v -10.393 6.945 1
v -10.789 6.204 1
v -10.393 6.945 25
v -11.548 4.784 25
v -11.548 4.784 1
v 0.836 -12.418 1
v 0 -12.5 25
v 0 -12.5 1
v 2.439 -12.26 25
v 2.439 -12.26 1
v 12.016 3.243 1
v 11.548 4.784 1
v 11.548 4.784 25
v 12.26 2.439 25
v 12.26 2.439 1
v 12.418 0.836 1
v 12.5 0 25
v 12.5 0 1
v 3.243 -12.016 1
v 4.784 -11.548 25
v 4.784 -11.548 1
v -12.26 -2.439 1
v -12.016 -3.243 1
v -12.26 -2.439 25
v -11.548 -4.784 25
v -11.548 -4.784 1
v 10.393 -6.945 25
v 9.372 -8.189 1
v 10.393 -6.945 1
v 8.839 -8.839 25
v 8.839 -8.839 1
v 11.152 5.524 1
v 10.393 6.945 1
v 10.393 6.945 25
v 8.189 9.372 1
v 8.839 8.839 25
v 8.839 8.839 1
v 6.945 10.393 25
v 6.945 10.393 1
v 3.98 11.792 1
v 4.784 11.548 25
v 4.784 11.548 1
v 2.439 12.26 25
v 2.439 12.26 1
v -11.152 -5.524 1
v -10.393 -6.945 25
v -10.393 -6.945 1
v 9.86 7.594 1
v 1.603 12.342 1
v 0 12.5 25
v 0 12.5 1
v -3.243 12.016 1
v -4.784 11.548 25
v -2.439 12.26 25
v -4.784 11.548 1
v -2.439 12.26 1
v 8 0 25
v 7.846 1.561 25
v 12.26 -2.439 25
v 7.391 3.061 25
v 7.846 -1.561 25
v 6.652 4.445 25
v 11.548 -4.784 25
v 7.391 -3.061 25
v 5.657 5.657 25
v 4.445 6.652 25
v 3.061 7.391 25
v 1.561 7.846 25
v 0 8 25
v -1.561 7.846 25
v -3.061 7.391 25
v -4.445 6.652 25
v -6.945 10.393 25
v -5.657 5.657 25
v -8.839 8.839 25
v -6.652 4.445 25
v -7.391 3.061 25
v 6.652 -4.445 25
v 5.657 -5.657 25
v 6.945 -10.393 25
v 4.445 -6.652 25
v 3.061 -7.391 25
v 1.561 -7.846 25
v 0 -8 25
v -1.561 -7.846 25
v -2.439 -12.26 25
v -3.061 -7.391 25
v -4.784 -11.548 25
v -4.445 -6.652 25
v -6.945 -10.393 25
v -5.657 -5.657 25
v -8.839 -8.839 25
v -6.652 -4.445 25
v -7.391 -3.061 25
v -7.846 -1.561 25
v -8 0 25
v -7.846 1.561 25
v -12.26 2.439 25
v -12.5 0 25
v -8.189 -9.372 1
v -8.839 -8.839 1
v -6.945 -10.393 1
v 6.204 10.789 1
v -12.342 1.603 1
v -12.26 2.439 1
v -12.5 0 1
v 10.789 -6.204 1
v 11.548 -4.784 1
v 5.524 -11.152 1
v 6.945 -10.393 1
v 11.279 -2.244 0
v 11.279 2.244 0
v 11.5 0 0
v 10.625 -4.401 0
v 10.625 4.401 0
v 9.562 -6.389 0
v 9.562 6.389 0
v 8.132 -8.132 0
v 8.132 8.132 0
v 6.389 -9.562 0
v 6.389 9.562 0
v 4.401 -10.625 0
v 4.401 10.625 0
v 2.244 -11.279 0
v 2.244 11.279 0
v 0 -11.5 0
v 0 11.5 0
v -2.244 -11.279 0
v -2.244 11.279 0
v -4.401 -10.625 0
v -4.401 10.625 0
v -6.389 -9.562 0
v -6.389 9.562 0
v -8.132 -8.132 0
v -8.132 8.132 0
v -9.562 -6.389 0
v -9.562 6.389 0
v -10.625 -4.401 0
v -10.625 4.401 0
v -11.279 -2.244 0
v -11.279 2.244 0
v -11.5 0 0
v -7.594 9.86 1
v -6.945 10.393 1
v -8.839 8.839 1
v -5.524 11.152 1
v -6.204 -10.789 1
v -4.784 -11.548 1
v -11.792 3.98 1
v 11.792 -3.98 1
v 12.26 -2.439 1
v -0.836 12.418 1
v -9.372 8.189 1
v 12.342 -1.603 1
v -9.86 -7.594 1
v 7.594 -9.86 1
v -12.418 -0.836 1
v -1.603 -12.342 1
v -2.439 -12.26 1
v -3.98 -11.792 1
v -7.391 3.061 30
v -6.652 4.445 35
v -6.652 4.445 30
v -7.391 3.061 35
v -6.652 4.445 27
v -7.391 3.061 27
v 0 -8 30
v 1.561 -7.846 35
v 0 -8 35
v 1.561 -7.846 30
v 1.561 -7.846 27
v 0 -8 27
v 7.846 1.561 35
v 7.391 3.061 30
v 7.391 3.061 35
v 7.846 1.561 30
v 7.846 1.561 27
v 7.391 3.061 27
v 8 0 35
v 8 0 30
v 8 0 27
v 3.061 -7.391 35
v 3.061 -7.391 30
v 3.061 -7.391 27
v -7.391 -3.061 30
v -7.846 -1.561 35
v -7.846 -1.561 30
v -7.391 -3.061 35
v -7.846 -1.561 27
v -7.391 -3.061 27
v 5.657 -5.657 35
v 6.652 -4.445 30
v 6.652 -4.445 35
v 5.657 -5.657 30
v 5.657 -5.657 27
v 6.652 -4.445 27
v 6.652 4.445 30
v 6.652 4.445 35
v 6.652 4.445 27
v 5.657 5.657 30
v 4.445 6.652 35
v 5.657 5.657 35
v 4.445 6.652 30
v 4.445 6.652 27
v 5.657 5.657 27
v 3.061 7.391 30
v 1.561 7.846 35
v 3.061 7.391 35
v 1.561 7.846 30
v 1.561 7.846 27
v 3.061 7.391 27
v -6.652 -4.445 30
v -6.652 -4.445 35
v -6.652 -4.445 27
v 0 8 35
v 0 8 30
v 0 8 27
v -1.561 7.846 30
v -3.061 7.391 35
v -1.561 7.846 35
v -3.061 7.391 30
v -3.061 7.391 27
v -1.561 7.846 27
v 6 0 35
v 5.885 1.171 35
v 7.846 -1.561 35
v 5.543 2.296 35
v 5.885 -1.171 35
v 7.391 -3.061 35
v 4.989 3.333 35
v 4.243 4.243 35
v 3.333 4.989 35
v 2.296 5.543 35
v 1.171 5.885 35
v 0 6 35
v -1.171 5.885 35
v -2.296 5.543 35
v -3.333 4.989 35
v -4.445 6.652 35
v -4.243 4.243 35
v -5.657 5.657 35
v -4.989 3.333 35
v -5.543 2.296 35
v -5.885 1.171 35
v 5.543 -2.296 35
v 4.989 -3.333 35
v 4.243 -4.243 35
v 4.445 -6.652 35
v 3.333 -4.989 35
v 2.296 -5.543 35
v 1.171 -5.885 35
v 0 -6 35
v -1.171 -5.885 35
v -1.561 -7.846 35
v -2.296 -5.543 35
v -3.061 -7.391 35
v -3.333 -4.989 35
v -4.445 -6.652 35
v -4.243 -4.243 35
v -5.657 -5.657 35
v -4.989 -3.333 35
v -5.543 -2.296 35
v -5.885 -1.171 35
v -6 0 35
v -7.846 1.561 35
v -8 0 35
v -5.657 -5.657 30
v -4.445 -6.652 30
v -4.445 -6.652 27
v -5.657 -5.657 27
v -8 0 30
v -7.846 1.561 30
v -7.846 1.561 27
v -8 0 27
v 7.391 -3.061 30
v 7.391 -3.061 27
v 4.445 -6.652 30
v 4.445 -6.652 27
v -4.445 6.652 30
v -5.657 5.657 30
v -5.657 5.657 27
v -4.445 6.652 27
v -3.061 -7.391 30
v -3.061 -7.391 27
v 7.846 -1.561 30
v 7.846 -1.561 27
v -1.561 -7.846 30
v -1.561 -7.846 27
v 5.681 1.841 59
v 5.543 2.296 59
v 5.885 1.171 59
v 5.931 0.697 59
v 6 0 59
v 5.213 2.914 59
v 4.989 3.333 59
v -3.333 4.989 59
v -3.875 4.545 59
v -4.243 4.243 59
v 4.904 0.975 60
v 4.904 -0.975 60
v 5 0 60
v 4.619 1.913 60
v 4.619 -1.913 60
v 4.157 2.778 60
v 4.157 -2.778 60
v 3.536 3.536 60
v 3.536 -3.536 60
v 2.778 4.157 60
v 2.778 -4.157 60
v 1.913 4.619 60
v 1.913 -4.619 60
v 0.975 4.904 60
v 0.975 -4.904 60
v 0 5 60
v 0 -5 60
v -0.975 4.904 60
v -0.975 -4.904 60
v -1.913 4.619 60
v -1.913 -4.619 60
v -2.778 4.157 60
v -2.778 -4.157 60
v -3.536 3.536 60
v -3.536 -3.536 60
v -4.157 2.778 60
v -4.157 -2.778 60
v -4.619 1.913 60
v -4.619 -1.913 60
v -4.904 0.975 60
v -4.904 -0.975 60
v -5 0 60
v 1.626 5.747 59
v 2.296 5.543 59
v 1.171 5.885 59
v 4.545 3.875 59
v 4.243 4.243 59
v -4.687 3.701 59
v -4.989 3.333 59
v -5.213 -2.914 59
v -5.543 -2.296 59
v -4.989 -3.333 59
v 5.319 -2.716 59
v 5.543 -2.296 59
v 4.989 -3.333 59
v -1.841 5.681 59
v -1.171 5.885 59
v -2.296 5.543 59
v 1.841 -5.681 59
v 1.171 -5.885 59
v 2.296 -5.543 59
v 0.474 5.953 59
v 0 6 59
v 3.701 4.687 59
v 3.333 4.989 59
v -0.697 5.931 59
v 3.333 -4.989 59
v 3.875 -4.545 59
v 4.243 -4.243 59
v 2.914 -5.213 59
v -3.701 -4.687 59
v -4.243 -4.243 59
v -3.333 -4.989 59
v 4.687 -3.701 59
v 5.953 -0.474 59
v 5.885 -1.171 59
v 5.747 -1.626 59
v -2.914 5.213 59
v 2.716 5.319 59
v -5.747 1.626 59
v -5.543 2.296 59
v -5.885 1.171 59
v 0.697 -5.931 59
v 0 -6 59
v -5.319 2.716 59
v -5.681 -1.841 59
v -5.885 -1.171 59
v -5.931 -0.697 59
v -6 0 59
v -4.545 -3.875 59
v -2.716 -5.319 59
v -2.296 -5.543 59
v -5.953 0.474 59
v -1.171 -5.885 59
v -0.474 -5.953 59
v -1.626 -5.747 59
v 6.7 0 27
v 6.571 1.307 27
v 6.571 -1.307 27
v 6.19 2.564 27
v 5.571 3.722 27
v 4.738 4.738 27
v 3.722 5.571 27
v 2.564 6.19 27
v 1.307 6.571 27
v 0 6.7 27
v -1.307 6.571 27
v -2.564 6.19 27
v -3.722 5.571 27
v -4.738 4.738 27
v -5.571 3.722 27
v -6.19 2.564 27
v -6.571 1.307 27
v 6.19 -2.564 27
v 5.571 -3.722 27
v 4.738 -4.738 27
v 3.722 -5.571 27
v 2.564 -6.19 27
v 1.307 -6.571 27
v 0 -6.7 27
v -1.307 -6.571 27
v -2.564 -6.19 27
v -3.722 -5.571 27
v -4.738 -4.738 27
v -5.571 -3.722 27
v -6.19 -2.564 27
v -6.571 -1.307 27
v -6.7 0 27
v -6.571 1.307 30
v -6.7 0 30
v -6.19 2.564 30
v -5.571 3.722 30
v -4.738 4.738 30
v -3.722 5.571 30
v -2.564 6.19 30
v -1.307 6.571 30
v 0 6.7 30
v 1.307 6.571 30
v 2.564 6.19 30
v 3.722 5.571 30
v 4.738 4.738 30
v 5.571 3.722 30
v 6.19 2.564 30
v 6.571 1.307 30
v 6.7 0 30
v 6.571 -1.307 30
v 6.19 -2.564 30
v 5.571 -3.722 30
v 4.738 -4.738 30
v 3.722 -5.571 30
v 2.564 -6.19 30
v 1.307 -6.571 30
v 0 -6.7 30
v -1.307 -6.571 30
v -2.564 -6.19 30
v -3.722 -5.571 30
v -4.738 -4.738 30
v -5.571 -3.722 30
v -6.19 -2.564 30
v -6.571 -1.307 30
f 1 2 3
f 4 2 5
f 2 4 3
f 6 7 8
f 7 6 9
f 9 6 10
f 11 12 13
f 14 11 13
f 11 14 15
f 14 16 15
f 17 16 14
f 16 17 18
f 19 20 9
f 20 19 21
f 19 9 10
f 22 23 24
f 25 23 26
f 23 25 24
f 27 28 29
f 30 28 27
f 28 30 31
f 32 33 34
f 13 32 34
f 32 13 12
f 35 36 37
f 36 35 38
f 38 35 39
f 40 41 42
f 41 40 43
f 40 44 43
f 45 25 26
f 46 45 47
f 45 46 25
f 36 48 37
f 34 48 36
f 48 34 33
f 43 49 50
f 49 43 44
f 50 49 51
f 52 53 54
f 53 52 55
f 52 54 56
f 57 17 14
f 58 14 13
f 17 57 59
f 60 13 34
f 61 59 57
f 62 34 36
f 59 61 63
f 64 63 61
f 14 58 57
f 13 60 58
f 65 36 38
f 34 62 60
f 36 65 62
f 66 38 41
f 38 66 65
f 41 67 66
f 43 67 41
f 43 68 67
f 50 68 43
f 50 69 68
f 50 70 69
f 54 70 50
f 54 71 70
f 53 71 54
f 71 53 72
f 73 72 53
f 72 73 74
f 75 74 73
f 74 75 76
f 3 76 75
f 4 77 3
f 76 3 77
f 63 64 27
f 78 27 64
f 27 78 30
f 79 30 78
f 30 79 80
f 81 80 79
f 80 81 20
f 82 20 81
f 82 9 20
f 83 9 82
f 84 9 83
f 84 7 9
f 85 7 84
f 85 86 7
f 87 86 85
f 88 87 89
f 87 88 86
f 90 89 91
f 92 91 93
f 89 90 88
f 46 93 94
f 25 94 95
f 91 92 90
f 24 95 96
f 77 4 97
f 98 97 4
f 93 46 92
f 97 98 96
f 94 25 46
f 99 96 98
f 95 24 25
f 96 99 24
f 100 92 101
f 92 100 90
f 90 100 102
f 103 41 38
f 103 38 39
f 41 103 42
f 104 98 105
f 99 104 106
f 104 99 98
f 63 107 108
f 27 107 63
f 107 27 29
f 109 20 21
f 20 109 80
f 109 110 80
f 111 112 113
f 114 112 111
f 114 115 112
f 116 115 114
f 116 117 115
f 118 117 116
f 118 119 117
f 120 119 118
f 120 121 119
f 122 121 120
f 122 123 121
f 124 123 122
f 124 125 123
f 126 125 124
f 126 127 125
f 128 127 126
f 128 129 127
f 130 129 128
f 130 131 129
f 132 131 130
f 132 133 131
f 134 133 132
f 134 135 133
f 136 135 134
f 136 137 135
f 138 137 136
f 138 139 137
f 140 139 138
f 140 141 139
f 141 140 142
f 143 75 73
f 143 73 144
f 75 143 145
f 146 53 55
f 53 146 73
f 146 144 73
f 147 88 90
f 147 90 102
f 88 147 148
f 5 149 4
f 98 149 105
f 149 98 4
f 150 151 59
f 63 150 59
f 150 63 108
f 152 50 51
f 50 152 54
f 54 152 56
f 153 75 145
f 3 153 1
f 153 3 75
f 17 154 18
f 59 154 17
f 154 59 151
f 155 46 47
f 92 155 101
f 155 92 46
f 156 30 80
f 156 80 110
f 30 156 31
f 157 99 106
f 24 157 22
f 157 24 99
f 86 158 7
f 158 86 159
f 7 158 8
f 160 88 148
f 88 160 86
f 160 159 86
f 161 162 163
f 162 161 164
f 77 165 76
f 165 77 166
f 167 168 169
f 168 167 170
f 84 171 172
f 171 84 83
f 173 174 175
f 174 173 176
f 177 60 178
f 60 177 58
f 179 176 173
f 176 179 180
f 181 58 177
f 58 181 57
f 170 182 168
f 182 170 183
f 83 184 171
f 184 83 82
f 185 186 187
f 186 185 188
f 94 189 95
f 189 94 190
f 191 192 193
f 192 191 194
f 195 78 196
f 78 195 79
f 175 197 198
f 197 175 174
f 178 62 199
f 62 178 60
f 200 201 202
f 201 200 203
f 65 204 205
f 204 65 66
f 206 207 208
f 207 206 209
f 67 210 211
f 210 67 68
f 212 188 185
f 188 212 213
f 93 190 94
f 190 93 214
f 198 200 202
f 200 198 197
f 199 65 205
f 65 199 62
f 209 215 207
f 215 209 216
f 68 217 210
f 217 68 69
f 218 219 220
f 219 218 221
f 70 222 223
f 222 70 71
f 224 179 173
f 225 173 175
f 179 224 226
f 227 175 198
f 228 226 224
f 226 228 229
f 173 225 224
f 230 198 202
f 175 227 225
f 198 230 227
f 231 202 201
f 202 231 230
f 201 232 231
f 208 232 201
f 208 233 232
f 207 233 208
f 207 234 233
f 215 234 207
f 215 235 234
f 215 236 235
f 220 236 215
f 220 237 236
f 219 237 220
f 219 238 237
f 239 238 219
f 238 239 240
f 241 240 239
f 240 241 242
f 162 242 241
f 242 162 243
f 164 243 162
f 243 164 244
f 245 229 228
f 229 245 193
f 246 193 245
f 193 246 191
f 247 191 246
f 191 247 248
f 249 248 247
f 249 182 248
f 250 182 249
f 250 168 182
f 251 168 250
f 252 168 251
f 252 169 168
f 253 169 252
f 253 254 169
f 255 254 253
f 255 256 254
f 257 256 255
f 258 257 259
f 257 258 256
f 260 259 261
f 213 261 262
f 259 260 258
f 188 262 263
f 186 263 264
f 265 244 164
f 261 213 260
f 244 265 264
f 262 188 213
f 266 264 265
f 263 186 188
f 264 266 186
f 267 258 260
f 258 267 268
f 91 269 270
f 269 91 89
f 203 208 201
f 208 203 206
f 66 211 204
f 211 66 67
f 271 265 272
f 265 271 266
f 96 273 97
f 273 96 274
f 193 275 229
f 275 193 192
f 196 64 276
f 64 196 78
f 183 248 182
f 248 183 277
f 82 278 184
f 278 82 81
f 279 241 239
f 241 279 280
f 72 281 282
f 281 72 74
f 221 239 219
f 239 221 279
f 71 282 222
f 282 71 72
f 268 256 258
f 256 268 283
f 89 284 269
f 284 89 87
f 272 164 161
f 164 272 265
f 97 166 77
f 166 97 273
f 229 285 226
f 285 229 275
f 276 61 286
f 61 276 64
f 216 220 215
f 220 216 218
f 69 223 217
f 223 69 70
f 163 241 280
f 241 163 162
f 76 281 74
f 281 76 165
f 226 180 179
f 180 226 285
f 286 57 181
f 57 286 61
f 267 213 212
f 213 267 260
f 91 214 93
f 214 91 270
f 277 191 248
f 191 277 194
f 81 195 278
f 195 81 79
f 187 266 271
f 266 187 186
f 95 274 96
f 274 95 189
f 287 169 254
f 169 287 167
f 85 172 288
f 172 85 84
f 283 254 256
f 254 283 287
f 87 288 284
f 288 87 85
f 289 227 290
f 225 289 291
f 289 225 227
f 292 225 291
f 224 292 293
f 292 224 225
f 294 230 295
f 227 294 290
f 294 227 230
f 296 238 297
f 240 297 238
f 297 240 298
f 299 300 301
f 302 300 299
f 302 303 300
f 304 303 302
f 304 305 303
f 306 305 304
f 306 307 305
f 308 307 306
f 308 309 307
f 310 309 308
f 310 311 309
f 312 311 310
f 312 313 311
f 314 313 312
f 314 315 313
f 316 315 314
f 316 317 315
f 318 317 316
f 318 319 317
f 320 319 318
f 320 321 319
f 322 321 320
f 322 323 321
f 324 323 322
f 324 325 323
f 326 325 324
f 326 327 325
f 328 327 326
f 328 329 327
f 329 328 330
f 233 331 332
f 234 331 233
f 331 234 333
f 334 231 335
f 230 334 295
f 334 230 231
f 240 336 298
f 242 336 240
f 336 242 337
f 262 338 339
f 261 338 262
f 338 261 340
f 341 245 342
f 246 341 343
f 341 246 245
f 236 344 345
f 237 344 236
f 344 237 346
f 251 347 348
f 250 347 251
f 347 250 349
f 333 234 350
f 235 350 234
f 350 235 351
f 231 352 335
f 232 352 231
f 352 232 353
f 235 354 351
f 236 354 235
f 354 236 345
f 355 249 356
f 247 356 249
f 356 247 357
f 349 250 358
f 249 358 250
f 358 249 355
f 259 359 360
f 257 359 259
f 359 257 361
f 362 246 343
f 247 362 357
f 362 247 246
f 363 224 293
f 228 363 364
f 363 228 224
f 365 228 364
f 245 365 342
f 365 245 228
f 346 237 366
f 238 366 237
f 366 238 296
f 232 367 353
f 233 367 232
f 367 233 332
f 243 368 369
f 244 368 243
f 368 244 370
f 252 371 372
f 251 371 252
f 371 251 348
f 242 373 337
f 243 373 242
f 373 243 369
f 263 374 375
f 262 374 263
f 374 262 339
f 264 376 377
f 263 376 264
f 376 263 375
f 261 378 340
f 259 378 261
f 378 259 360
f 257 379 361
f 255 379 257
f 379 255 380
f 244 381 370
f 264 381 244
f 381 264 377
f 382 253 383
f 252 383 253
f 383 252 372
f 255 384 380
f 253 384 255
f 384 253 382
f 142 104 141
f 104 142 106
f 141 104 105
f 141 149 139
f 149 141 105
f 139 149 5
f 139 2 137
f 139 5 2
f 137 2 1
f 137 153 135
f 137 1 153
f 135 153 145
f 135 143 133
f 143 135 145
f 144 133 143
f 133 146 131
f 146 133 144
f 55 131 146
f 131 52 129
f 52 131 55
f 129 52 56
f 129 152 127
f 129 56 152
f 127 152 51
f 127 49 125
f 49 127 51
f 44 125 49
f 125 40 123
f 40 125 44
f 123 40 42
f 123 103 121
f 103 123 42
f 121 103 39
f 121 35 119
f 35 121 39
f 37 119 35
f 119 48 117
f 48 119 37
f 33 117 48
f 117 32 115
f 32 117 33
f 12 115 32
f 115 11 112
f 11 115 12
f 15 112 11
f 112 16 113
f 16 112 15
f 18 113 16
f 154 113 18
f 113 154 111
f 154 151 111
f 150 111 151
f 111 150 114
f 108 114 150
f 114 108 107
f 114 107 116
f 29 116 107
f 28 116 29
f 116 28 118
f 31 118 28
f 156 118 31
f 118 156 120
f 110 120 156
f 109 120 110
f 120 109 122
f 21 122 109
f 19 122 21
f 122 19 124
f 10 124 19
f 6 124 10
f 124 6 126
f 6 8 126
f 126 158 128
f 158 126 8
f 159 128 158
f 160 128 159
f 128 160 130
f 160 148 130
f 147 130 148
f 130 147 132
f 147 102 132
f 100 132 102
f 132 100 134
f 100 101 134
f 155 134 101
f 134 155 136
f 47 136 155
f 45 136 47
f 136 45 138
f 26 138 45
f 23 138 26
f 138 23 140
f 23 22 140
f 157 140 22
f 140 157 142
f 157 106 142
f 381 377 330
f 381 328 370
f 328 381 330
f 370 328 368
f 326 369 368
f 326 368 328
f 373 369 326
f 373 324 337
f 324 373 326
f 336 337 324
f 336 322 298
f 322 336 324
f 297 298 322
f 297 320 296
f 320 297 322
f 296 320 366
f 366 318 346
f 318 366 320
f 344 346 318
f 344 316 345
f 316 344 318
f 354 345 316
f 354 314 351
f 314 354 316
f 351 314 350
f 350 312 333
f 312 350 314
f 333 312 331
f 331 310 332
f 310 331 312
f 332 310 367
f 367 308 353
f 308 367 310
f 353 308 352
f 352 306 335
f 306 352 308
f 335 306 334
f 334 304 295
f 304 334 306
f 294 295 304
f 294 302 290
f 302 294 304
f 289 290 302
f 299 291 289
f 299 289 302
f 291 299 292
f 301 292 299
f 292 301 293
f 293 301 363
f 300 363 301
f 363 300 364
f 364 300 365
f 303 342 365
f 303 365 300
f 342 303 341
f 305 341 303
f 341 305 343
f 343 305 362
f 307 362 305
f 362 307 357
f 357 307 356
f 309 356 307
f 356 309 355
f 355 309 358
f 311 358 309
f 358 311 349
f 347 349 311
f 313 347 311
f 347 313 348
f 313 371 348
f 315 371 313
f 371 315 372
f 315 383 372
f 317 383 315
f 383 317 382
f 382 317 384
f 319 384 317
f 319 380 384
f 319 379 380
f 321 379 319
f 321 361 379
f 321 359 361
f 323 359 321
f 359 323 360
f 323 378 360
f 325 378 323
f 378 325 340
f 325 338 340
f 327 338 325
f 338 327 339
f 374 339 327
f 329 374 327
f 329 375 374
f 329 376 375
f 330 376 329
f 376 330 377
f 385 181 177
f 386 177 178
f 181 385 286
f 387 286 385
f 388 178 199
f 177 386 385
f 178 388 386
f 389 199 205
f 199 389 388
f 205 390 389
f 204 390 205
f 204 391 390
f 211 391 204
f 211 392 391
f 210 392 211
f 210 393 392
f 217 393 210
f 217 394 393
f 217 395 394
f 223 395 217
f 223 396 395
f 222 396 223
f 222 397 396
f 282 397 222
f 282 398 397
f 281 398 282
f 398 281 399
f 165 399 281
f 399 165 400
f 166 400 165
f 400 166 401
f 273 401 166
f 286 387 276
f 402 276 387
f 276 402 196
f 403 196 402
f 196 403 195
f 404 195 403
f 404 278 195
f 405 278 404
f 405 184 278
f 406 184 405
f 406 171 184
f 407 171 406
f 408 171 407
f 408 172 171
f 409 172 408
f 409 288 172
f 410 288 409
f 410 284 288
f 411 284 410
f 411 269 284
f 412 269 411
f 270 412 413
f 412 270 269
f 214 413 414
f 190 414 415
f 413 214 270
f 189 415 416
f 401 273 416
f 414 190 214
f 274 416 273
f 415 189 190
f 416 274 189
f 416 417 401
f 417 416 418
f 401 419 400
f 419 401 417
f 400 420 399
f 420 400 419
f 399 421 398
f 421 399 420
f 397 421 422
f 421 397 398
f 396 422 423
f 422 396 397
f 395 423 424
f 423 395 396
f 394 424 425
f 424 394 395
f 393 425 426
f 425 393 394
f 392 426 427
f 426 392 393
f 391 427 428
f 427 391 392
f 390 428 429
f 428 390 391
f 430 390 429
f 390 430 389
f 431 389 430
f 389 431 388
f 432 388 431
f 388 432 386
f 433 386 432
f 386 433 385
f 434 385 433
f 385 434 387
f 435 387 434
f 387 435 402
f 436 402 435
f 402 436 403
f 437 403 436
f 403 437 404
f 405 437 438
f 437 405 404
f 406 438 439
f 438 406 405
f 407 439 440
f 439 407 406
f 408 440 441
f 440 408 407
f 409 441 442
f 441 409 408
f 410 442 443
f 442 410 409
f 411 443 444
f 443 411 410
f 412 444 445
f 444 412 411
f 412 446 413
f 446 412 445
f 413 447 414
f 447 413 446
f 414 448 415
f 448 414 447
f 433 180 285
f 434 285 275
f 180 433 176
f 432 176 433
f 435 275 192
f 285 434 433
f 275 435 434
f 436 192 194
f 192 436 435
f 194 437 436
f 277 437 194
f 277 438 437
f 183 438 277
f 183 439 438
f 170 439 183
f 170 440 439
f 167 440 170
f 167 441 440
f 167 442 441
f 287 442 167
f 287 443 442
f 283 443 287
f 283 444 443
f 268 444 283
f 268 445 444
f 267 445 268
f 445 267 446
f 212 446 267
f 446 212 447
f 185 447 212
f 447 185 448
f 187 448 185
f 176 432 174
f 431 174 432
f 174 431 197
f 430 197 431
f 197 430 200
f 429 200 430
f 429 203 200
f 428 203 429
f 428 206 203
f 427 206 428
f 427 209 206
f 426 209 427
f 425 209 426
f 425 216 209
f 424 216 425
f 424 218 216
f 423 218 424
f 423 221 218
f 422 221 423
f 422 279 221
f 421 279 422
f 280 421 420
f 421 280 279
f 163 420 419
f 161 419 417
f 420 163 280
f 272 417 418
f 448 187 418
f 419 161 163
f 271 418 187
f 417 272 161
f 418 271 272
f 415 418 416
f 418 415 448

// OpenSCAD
$fn = 32;

// ----------------------------------------------------------------------
// Stepped shaft: diameters 25, 16, 12 mm, 60 mm long
// ----------------------------------------------------------------------

// --- parameters (mm) ---
d1 = 25;                  // step 1 diameter
len1 = 25;                // step 1 length
d2 = 16;                  // step 2 diameter
len2 = 10;                // step 2 length
d3 = 12;                  // step 3 diameter
len3 = 25;                // step 3 length
total = 60;               // overall length
chamfer = 1;              // end chamfer
groove_r = 8;             // groove radius
groove_z = 27;            // groove position from the end
groove_w = 3;             // groove width
groove_d = 1.3;           // groove depth

difference() {
  /* turned body: stacked cylinders, every step sunk into the bigger one */
  union() {
    cylinder(h = len1, d = d1);
    translate([0, 0, 24.6]) cylinder(h = 10.4, d = d2);
    translate([0, 0, 34.6]) cylinder(h = 25.4, d = d3);
  }
  /* bottom chamfer ring cut */
  rotate_extrude() translate([11.5, -2.5]) polygon([[0, 0], [3.5, 0], [3.5, 6], [0, 2.5]]);
  /* top chamfer ring cut */
  rotate_extrude() translate([5, 60]) polygon([[0, 0], [3.5, -3.5], [3.5, 2.5], [0, 2.5]]);
  /* circlip groove just behind the shoulder */
  rotate_extrude() translate([groove_r - groove_d, groove_z]) square([groove_d + 2.5, groove_w]);
}
